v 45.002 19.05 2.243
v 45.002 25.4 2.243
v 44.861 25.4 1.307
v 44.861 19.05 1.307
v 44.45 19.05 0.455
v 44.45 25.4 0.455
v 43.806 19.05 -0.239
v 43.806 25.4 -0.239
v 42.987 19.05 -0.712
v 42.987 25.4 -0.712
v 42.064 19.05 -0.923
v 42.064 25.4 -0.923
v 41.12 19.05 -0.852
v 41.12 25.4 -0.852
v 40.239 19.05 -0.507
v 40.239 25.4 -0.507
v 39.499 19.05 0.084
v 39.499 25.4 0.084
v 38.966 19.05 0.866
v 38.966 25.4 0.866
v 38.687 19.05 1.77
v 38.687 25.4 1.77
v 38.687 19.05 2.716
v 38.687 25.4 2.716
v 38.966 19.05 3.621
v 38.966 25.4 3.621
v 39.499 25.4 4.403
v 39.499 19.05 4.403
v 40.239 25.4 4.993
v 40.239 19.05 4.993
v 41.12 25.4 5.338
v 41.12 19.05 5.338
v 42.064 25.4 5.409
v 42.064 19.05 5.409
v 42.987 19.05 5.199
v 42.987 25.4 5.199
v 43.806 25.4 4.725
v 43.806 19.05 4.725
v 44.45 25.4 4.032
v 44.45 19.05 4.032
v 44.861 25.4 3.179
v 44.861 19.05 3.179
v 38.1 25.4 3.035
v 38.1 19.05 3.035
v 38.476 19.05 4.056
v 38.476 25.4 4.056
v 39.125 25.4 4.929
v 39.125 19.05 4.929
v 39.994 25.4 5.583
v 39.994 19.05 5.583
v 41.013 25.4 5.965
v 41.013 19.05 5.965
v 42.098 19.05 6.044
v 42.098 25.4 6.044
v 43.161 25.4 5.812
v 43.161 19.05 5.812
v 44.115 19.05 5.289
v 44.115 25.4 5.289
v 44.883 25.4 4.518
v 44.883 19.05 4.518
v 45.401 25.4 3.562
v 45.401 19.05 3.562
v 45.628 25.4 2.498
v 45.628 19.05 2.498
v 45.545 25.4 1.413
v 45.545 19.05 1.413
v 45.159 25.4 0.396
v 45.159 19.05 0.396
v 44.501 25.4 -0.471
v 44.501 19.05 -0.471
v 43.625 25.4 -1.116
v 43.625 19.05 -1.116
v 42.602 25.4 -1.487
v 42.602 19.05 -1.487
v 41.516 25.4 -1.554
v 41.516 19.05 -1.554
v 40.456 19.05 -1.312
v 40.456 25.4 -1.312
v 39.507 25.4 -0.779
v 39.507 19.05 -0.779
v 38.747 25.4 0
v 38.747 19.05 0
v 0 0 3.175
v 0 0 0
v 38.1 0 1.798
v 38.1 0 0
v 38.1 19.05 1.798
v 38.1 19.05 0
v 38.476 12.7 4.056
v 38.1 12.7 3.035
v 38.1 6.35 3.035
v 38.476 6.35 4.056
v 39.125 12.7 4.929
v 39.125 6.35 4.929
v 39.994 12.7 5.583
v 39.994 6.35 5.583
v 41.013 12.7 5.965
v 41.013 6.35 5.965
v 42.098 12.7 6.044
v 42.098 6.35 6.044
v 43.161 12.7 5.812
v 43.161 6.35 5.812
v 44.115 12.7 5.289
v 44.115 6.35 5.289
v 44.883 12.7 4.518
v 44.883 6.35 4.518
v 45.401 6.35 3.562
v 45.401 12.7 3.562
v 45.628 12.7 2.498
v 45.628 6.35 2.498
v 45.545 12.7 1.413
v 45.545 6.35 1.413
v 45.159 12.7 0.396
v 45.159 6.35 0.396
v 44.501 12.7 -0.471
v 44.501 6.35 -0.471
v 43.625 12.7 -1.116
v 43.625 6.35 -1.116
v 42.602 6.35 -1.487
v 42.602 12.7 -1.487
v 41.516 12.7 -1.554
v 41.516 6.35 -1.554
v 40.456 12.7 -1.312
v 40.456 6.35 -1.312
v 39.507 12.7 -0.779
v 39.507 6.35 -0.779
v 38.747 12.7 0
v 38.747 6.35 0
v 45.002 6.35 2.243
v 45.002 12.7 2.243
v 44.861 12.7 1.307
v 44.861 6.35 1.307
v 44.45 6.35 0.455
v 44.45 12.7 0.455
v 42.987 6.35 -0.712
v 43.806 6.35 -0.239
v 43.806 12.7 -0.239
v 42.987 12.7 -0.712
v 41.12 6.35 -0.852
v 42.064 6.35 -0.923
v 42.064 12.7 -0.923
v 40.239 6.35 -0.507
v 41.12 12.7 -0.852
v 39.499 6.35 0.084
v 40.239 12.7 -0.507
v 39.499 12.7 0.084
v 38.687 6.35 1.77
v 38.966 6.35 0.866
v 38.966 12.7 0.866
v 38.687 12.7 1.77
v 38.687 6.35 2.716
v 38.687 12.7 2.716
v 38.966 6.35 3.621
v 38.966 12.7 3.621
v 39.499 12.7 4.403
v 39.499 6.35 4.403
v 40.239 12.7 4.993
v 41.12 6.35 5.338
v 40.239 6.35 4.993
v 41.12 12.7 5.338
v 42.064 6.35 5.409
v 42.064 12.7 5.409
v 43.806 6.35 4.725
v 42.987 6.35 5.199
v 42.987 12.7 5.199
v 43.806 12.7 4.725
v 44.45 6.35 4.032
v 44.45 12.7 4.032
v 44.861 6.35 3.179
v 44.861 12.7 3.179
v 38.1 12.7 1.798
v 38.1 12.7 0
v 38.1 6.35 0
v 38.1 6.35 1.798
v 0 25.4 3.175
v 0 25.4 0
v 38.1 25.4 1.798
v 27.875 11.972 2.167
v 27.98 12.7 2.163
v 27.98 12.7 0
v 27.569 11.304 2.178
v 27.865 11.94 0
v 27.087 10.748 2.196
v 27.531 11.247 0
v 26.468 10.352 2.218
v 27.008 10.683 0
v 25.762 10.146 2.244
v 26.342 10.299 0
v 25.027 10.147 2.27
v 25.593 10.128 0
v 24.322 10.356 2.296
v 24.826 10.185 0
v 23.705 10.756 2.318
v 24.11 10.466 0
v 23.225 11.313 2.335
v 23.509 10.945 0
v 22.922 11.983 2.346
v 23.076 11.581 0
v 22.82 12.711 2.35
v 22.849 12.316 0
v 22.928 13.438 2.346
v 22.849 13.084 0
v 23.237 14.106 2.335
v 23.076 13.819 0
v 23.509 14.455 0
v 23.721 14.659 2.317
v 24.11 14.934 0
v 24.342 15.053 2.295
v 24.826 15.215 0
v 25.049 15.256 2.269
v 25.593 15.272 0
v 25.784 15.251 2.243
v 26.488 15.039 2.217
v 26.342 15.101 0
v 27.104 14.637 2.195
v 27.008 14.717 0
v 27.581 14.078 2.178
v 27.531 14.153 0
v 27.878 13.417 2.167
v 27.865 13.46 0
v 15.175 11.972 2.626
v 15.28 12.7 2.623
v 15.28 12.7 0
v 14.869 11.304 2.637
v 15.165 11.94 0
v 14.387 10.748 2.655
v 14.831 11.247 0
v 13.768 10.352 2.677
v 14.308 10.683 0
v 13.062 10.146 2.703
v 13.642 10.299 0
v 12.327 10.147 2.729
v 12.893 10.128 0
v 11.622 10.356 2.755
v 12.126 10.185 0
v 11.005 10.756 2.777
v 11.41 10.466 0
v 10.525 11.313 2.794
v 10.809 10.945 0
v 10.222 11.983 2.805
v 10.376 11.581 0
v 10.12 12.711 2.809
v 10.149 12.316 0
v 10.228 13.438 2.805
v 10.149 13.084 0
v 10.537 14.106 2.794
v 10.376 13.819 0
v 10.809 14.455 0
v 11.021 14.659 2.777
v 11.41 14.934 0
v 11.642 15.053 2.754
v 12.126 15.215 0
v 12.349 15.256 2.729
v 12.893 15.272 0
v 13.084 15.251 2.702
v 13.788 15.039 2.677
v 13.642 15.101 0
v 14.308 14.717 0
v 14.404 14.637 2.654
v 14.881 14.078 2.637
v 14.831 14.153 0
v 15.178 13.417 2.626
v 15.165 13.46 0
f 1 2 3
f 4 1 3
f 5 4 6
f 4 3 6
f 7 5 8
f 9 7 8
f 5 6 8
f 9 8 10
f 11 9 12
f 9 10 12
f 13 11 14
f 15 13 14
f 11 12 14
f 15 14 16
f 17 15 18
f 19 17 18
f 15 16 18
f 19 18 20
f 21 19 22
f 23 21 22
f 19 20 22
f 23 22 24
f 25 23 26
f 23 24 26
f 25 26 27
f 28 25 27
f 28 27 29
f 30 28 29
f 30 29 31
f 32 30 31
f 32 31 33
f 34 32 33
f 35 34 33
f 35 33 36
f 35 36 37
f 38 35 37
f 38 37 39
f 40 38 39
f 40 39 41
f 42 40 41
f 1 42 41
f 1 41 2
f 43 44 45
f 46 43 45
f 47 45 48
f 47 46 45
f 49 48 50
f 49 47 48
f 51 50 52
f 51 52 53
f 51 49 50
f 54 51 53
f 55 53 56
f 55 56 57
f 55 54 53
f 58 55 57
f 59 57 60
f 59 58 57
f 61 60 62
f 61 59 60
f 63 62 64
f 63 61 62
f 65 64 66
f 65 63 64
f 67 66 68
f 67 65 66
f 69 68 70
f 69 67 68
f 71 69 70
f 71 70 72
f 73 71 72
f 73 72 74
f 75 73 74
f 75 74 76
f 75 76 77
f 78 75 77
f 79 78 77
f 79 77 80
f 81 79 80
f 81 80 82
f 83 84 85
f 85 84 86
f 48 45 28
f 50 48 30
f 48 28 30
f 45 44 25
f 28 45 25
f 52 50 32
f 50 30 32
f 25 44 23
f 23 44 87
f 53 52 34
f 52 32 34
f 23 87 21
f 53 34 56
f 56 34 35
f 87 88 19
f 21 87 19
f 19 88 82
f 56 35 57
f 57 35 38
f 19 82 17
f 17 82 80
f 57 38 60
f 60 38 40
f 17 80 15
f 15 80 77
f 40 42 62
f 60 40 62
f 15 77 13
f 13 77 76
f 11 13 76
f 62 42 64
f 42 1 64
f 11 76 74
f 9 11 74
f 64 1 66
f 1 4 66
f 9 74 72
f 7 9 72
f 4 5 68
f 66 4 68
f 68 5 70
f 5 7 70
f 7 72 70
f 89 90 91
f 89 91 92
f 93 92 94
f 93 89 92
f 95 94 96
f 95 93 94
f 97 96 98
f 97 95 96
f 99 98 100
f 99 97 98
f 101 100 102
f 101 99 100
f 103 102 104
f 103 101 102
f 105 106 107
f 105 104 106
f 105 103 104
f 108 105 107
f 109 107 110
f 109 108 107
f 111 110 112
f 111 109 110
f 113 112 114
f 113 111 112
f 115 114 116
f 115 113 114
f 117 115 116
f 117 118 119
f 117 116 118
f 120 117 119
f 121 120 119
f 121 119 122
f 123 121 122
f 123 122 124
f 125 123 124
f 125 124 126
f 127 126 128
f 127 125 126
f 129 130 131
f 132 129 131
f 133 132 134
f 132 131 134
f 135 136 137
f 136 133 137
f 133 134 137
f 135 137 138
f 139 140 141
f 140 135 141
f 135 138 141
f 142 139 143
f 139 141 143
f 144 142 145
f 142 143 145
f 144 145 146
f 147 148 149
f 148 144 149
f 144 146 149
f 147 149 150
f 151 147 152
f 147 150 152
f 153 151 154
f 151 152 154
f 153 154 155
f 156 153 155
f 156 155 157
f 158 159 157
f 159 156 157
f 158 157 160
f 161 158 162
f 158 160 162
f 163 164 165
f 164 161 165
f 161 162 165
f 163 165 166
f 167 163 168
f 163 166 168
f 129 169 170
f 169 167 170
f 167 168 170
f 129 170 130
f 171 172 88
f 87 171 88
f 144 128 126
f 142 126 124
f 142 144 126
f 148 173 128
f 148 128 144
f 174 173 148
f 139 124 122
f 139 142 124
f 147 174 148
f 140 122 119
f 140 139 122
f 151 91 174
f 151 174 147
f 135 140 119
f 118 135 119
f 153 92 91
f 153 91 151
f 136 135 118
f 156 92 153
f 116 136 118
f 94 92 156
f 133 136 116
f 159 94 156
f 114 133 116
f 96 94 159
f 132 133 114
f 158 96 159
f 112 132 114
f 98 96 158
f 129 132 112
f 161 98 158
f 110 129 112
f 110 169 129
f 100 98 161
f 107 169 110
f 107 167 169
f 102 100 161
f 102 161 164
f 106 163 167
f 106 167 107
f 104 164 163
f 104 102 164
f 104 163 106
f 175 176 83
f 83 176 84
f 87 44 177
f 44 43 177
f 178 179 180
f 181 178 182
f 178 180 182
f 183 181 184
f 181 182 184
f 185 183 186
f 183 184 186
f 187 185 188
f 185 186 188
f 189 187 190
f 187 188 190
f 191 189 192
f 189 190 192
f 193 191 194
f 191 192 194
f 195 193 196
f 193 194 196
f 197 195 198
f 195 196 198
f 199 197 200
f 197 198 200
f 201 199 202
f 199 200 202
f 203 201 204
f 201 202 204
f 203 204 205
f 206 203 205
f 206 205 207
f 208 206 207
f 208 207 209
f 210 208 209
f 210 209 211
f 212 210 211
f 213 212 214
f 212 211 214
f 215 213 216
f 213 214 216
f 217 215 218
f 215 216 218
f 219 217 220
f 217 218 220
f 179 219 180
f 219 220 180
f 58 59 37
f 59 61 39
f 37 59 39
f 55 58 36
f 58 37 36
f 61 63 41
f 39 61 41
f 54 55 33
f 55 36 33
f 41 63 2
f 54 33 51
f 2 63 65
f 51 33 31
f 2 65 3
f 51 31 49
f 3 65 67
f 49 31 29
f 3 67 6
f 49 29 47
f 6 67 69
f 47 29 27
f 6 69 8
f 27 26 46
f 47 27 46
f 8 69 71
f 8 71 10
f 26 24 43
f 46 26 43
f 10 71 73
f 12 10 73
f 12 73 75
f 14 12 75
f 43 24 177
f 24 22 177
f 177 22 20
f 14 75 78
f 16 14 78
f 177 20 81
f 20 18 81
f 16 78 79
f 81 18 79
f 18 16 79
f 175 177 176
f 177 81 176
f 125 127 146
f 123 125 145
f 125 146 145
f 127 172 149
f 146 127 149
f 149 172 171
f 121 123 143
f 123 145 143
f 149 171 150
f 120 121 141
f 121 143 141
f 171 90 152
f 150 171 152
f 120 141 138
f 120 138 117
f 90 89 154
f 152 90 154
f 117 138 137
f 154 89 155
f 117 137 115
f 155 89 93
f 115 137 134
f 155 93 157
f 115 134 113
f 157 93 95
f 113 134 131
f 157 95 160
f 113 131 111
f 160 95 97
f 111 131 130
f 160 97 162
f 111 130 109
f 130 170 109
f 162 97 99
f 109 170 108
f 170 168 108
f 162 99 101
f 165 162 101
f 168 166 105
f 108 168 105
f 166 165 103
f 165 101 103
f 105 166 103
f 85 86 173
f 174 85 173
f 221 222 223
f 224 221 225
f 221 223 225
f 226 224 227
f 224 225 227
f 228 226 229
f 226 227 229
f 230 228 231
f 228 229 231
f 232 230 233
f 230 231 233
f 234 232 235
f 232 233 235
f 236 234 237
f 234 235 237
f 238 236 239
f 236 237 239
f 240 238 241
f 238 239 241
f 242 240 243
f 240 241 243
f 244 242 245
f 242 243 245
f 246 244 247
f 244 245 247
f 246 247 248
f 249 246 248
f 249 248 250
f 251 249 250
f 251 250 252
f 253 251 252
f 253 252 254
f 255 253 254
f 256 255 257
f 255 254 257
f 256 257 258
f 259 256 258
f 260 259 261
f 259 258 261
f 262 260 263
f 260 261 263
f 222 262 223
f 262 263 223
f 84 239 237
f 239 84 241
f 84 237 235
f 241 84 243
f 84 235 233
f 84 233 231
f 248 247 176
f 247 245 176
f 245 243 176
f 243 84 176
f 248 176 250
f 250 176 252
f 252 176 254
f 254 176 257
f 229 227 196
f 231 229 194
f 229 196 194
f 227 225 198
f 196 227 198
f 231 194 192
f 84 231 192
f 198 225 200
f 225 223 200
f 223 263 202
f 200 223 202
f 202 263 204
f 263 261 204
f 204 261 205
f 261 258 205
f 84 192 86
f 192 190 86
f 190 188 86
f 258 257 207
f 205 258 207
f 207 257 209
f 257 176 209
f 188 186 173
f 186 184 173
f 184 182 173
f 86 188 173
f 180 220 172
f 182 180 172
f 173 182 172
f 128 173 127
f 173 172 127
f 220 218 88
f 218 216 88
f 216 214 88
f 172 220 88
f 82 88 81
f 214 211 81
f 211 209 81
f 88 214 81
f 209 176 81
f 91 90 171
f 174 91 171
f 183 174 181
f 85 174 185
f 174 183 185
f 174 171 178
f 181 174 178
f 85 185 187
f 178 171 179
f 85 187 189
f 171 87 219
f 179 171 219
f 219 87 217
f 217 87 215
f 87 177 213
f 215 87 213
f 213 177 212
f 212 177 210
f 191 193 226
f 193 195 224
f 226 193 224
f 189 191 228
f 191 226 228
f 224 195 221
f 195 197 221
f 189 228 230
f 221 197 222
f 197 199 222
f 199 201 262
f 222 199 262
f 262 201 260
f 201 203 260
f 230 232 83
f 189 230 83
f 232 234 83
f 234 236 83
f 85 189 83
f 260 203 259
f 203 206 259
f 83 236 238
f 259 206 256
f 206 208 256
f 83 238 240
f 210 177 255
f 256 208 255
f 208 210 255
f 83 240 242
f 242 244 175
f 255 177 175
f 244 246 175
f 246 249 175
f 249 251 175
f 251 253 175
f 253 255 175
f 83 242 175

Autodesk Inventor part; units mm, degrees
ref_plane "YZ Plane" through (0, 0, 0) normal (1, 0, 0) x (0, 1, 0)
ref_plane "XZ Plane" through (0, 0, 0) normal (0, 1, 0) x (-1, 0, 0)
sketch "Sketch1" plane through (0, 0, 0) normal (0, 0, 1) x (1, 0, 0)
  line L0 (0, 0) -> (38.1, 0)
  line L1 (38.1, 0) -> (38.1, 25.4)
  line L2 (38.1, 25.4) -> (0, 25.4)
  line L3 (0, 25.4) -> (0, 0)
  line L4 (0, 12.7) -> (12.7, 12.7) construction
  line L5 (12.7, 12.7) -> (25.4, 12.7) construction
  circle A0 centre (12.7, 12.7) radius 2.5797
  circle A1 centre (25.4, 12.7) radius 2.5797
  dimension "d0" = 38.1
  dimension "d1" = 25.4
  dimension "d2" = 12.7
  dimension "d3" = 12.7
  dimension "d4" = 5.1594
  dimension "d5" = 5.1594
extrude "Extrusion1" add sketch "Sketch1" along normal blind 3.175
sketch "Sketch2" plane through (0, 25.4, 0) normal (0, 1, 0) x (1, 0, 0)
  circle A0 centre (41.8269, -2.2431) radius 3.175
  arc A1 (38.1, -3.0347) -> (38.7472, 0) centre (41.8269, -2.2431) ccw
  line L0 (0, 0) -> (38.1, 0) projected
  line L1 (38.7472, 0) -> (38.1, 0)
  line L2 (38.1, 0) -> (38.1, -3.175) projected
  line L3 (38.1, 0) -> (38.1, -3.175)
  dimension "d8" = 6.35
  dimension "d9" = 7.62
extrude "Extrusion2" add sketch "Sketch2" against normal blind 6.35
ref_plane "Work Plane1" through (0, 12.7, 0) normal (0, -1, 0) x (1, 0, 0)
sketch "Sketch3" plane through (0, 12.7, 0) normal (0, -1, 0) x (1, 0, 0)
  arc A0 (38.7472, 0) -> (38.1, 3.0347) centre (41.8269, 2.2431) ccw projected
  circle A1 centre (41.8269, 2.2431) radius 3.175 projected
  line L0 (38.1, 0) -> (38.7472, 0) projected
  line L1 (38.1, 0) -> (38.1, 3.0347) projected
  line L2 (38.1, 3.0347) -> (38.1, 0)
  point P0 (0, 0)
extrude "Extrusion3" add sketch "Sketch3" along normal blind 6.35
sketch "Sketch4" plane through (0, 25.4, 3.175) normal (0, 1, 0) x (1, 0, 0)
  line L0 (38.1, 0) -> (38.1, 1.3774)
  line L1 (0, 3.175) -> (0, 0) projected
  line L2 (38.1, 1.3774) -> (0, 0)
  line L3 (0, 0) -> (38.1, 0)
extrude "Extrusion4" cut sketch "Sketch4" against normal blind 50.8
properties part number "hinge"
